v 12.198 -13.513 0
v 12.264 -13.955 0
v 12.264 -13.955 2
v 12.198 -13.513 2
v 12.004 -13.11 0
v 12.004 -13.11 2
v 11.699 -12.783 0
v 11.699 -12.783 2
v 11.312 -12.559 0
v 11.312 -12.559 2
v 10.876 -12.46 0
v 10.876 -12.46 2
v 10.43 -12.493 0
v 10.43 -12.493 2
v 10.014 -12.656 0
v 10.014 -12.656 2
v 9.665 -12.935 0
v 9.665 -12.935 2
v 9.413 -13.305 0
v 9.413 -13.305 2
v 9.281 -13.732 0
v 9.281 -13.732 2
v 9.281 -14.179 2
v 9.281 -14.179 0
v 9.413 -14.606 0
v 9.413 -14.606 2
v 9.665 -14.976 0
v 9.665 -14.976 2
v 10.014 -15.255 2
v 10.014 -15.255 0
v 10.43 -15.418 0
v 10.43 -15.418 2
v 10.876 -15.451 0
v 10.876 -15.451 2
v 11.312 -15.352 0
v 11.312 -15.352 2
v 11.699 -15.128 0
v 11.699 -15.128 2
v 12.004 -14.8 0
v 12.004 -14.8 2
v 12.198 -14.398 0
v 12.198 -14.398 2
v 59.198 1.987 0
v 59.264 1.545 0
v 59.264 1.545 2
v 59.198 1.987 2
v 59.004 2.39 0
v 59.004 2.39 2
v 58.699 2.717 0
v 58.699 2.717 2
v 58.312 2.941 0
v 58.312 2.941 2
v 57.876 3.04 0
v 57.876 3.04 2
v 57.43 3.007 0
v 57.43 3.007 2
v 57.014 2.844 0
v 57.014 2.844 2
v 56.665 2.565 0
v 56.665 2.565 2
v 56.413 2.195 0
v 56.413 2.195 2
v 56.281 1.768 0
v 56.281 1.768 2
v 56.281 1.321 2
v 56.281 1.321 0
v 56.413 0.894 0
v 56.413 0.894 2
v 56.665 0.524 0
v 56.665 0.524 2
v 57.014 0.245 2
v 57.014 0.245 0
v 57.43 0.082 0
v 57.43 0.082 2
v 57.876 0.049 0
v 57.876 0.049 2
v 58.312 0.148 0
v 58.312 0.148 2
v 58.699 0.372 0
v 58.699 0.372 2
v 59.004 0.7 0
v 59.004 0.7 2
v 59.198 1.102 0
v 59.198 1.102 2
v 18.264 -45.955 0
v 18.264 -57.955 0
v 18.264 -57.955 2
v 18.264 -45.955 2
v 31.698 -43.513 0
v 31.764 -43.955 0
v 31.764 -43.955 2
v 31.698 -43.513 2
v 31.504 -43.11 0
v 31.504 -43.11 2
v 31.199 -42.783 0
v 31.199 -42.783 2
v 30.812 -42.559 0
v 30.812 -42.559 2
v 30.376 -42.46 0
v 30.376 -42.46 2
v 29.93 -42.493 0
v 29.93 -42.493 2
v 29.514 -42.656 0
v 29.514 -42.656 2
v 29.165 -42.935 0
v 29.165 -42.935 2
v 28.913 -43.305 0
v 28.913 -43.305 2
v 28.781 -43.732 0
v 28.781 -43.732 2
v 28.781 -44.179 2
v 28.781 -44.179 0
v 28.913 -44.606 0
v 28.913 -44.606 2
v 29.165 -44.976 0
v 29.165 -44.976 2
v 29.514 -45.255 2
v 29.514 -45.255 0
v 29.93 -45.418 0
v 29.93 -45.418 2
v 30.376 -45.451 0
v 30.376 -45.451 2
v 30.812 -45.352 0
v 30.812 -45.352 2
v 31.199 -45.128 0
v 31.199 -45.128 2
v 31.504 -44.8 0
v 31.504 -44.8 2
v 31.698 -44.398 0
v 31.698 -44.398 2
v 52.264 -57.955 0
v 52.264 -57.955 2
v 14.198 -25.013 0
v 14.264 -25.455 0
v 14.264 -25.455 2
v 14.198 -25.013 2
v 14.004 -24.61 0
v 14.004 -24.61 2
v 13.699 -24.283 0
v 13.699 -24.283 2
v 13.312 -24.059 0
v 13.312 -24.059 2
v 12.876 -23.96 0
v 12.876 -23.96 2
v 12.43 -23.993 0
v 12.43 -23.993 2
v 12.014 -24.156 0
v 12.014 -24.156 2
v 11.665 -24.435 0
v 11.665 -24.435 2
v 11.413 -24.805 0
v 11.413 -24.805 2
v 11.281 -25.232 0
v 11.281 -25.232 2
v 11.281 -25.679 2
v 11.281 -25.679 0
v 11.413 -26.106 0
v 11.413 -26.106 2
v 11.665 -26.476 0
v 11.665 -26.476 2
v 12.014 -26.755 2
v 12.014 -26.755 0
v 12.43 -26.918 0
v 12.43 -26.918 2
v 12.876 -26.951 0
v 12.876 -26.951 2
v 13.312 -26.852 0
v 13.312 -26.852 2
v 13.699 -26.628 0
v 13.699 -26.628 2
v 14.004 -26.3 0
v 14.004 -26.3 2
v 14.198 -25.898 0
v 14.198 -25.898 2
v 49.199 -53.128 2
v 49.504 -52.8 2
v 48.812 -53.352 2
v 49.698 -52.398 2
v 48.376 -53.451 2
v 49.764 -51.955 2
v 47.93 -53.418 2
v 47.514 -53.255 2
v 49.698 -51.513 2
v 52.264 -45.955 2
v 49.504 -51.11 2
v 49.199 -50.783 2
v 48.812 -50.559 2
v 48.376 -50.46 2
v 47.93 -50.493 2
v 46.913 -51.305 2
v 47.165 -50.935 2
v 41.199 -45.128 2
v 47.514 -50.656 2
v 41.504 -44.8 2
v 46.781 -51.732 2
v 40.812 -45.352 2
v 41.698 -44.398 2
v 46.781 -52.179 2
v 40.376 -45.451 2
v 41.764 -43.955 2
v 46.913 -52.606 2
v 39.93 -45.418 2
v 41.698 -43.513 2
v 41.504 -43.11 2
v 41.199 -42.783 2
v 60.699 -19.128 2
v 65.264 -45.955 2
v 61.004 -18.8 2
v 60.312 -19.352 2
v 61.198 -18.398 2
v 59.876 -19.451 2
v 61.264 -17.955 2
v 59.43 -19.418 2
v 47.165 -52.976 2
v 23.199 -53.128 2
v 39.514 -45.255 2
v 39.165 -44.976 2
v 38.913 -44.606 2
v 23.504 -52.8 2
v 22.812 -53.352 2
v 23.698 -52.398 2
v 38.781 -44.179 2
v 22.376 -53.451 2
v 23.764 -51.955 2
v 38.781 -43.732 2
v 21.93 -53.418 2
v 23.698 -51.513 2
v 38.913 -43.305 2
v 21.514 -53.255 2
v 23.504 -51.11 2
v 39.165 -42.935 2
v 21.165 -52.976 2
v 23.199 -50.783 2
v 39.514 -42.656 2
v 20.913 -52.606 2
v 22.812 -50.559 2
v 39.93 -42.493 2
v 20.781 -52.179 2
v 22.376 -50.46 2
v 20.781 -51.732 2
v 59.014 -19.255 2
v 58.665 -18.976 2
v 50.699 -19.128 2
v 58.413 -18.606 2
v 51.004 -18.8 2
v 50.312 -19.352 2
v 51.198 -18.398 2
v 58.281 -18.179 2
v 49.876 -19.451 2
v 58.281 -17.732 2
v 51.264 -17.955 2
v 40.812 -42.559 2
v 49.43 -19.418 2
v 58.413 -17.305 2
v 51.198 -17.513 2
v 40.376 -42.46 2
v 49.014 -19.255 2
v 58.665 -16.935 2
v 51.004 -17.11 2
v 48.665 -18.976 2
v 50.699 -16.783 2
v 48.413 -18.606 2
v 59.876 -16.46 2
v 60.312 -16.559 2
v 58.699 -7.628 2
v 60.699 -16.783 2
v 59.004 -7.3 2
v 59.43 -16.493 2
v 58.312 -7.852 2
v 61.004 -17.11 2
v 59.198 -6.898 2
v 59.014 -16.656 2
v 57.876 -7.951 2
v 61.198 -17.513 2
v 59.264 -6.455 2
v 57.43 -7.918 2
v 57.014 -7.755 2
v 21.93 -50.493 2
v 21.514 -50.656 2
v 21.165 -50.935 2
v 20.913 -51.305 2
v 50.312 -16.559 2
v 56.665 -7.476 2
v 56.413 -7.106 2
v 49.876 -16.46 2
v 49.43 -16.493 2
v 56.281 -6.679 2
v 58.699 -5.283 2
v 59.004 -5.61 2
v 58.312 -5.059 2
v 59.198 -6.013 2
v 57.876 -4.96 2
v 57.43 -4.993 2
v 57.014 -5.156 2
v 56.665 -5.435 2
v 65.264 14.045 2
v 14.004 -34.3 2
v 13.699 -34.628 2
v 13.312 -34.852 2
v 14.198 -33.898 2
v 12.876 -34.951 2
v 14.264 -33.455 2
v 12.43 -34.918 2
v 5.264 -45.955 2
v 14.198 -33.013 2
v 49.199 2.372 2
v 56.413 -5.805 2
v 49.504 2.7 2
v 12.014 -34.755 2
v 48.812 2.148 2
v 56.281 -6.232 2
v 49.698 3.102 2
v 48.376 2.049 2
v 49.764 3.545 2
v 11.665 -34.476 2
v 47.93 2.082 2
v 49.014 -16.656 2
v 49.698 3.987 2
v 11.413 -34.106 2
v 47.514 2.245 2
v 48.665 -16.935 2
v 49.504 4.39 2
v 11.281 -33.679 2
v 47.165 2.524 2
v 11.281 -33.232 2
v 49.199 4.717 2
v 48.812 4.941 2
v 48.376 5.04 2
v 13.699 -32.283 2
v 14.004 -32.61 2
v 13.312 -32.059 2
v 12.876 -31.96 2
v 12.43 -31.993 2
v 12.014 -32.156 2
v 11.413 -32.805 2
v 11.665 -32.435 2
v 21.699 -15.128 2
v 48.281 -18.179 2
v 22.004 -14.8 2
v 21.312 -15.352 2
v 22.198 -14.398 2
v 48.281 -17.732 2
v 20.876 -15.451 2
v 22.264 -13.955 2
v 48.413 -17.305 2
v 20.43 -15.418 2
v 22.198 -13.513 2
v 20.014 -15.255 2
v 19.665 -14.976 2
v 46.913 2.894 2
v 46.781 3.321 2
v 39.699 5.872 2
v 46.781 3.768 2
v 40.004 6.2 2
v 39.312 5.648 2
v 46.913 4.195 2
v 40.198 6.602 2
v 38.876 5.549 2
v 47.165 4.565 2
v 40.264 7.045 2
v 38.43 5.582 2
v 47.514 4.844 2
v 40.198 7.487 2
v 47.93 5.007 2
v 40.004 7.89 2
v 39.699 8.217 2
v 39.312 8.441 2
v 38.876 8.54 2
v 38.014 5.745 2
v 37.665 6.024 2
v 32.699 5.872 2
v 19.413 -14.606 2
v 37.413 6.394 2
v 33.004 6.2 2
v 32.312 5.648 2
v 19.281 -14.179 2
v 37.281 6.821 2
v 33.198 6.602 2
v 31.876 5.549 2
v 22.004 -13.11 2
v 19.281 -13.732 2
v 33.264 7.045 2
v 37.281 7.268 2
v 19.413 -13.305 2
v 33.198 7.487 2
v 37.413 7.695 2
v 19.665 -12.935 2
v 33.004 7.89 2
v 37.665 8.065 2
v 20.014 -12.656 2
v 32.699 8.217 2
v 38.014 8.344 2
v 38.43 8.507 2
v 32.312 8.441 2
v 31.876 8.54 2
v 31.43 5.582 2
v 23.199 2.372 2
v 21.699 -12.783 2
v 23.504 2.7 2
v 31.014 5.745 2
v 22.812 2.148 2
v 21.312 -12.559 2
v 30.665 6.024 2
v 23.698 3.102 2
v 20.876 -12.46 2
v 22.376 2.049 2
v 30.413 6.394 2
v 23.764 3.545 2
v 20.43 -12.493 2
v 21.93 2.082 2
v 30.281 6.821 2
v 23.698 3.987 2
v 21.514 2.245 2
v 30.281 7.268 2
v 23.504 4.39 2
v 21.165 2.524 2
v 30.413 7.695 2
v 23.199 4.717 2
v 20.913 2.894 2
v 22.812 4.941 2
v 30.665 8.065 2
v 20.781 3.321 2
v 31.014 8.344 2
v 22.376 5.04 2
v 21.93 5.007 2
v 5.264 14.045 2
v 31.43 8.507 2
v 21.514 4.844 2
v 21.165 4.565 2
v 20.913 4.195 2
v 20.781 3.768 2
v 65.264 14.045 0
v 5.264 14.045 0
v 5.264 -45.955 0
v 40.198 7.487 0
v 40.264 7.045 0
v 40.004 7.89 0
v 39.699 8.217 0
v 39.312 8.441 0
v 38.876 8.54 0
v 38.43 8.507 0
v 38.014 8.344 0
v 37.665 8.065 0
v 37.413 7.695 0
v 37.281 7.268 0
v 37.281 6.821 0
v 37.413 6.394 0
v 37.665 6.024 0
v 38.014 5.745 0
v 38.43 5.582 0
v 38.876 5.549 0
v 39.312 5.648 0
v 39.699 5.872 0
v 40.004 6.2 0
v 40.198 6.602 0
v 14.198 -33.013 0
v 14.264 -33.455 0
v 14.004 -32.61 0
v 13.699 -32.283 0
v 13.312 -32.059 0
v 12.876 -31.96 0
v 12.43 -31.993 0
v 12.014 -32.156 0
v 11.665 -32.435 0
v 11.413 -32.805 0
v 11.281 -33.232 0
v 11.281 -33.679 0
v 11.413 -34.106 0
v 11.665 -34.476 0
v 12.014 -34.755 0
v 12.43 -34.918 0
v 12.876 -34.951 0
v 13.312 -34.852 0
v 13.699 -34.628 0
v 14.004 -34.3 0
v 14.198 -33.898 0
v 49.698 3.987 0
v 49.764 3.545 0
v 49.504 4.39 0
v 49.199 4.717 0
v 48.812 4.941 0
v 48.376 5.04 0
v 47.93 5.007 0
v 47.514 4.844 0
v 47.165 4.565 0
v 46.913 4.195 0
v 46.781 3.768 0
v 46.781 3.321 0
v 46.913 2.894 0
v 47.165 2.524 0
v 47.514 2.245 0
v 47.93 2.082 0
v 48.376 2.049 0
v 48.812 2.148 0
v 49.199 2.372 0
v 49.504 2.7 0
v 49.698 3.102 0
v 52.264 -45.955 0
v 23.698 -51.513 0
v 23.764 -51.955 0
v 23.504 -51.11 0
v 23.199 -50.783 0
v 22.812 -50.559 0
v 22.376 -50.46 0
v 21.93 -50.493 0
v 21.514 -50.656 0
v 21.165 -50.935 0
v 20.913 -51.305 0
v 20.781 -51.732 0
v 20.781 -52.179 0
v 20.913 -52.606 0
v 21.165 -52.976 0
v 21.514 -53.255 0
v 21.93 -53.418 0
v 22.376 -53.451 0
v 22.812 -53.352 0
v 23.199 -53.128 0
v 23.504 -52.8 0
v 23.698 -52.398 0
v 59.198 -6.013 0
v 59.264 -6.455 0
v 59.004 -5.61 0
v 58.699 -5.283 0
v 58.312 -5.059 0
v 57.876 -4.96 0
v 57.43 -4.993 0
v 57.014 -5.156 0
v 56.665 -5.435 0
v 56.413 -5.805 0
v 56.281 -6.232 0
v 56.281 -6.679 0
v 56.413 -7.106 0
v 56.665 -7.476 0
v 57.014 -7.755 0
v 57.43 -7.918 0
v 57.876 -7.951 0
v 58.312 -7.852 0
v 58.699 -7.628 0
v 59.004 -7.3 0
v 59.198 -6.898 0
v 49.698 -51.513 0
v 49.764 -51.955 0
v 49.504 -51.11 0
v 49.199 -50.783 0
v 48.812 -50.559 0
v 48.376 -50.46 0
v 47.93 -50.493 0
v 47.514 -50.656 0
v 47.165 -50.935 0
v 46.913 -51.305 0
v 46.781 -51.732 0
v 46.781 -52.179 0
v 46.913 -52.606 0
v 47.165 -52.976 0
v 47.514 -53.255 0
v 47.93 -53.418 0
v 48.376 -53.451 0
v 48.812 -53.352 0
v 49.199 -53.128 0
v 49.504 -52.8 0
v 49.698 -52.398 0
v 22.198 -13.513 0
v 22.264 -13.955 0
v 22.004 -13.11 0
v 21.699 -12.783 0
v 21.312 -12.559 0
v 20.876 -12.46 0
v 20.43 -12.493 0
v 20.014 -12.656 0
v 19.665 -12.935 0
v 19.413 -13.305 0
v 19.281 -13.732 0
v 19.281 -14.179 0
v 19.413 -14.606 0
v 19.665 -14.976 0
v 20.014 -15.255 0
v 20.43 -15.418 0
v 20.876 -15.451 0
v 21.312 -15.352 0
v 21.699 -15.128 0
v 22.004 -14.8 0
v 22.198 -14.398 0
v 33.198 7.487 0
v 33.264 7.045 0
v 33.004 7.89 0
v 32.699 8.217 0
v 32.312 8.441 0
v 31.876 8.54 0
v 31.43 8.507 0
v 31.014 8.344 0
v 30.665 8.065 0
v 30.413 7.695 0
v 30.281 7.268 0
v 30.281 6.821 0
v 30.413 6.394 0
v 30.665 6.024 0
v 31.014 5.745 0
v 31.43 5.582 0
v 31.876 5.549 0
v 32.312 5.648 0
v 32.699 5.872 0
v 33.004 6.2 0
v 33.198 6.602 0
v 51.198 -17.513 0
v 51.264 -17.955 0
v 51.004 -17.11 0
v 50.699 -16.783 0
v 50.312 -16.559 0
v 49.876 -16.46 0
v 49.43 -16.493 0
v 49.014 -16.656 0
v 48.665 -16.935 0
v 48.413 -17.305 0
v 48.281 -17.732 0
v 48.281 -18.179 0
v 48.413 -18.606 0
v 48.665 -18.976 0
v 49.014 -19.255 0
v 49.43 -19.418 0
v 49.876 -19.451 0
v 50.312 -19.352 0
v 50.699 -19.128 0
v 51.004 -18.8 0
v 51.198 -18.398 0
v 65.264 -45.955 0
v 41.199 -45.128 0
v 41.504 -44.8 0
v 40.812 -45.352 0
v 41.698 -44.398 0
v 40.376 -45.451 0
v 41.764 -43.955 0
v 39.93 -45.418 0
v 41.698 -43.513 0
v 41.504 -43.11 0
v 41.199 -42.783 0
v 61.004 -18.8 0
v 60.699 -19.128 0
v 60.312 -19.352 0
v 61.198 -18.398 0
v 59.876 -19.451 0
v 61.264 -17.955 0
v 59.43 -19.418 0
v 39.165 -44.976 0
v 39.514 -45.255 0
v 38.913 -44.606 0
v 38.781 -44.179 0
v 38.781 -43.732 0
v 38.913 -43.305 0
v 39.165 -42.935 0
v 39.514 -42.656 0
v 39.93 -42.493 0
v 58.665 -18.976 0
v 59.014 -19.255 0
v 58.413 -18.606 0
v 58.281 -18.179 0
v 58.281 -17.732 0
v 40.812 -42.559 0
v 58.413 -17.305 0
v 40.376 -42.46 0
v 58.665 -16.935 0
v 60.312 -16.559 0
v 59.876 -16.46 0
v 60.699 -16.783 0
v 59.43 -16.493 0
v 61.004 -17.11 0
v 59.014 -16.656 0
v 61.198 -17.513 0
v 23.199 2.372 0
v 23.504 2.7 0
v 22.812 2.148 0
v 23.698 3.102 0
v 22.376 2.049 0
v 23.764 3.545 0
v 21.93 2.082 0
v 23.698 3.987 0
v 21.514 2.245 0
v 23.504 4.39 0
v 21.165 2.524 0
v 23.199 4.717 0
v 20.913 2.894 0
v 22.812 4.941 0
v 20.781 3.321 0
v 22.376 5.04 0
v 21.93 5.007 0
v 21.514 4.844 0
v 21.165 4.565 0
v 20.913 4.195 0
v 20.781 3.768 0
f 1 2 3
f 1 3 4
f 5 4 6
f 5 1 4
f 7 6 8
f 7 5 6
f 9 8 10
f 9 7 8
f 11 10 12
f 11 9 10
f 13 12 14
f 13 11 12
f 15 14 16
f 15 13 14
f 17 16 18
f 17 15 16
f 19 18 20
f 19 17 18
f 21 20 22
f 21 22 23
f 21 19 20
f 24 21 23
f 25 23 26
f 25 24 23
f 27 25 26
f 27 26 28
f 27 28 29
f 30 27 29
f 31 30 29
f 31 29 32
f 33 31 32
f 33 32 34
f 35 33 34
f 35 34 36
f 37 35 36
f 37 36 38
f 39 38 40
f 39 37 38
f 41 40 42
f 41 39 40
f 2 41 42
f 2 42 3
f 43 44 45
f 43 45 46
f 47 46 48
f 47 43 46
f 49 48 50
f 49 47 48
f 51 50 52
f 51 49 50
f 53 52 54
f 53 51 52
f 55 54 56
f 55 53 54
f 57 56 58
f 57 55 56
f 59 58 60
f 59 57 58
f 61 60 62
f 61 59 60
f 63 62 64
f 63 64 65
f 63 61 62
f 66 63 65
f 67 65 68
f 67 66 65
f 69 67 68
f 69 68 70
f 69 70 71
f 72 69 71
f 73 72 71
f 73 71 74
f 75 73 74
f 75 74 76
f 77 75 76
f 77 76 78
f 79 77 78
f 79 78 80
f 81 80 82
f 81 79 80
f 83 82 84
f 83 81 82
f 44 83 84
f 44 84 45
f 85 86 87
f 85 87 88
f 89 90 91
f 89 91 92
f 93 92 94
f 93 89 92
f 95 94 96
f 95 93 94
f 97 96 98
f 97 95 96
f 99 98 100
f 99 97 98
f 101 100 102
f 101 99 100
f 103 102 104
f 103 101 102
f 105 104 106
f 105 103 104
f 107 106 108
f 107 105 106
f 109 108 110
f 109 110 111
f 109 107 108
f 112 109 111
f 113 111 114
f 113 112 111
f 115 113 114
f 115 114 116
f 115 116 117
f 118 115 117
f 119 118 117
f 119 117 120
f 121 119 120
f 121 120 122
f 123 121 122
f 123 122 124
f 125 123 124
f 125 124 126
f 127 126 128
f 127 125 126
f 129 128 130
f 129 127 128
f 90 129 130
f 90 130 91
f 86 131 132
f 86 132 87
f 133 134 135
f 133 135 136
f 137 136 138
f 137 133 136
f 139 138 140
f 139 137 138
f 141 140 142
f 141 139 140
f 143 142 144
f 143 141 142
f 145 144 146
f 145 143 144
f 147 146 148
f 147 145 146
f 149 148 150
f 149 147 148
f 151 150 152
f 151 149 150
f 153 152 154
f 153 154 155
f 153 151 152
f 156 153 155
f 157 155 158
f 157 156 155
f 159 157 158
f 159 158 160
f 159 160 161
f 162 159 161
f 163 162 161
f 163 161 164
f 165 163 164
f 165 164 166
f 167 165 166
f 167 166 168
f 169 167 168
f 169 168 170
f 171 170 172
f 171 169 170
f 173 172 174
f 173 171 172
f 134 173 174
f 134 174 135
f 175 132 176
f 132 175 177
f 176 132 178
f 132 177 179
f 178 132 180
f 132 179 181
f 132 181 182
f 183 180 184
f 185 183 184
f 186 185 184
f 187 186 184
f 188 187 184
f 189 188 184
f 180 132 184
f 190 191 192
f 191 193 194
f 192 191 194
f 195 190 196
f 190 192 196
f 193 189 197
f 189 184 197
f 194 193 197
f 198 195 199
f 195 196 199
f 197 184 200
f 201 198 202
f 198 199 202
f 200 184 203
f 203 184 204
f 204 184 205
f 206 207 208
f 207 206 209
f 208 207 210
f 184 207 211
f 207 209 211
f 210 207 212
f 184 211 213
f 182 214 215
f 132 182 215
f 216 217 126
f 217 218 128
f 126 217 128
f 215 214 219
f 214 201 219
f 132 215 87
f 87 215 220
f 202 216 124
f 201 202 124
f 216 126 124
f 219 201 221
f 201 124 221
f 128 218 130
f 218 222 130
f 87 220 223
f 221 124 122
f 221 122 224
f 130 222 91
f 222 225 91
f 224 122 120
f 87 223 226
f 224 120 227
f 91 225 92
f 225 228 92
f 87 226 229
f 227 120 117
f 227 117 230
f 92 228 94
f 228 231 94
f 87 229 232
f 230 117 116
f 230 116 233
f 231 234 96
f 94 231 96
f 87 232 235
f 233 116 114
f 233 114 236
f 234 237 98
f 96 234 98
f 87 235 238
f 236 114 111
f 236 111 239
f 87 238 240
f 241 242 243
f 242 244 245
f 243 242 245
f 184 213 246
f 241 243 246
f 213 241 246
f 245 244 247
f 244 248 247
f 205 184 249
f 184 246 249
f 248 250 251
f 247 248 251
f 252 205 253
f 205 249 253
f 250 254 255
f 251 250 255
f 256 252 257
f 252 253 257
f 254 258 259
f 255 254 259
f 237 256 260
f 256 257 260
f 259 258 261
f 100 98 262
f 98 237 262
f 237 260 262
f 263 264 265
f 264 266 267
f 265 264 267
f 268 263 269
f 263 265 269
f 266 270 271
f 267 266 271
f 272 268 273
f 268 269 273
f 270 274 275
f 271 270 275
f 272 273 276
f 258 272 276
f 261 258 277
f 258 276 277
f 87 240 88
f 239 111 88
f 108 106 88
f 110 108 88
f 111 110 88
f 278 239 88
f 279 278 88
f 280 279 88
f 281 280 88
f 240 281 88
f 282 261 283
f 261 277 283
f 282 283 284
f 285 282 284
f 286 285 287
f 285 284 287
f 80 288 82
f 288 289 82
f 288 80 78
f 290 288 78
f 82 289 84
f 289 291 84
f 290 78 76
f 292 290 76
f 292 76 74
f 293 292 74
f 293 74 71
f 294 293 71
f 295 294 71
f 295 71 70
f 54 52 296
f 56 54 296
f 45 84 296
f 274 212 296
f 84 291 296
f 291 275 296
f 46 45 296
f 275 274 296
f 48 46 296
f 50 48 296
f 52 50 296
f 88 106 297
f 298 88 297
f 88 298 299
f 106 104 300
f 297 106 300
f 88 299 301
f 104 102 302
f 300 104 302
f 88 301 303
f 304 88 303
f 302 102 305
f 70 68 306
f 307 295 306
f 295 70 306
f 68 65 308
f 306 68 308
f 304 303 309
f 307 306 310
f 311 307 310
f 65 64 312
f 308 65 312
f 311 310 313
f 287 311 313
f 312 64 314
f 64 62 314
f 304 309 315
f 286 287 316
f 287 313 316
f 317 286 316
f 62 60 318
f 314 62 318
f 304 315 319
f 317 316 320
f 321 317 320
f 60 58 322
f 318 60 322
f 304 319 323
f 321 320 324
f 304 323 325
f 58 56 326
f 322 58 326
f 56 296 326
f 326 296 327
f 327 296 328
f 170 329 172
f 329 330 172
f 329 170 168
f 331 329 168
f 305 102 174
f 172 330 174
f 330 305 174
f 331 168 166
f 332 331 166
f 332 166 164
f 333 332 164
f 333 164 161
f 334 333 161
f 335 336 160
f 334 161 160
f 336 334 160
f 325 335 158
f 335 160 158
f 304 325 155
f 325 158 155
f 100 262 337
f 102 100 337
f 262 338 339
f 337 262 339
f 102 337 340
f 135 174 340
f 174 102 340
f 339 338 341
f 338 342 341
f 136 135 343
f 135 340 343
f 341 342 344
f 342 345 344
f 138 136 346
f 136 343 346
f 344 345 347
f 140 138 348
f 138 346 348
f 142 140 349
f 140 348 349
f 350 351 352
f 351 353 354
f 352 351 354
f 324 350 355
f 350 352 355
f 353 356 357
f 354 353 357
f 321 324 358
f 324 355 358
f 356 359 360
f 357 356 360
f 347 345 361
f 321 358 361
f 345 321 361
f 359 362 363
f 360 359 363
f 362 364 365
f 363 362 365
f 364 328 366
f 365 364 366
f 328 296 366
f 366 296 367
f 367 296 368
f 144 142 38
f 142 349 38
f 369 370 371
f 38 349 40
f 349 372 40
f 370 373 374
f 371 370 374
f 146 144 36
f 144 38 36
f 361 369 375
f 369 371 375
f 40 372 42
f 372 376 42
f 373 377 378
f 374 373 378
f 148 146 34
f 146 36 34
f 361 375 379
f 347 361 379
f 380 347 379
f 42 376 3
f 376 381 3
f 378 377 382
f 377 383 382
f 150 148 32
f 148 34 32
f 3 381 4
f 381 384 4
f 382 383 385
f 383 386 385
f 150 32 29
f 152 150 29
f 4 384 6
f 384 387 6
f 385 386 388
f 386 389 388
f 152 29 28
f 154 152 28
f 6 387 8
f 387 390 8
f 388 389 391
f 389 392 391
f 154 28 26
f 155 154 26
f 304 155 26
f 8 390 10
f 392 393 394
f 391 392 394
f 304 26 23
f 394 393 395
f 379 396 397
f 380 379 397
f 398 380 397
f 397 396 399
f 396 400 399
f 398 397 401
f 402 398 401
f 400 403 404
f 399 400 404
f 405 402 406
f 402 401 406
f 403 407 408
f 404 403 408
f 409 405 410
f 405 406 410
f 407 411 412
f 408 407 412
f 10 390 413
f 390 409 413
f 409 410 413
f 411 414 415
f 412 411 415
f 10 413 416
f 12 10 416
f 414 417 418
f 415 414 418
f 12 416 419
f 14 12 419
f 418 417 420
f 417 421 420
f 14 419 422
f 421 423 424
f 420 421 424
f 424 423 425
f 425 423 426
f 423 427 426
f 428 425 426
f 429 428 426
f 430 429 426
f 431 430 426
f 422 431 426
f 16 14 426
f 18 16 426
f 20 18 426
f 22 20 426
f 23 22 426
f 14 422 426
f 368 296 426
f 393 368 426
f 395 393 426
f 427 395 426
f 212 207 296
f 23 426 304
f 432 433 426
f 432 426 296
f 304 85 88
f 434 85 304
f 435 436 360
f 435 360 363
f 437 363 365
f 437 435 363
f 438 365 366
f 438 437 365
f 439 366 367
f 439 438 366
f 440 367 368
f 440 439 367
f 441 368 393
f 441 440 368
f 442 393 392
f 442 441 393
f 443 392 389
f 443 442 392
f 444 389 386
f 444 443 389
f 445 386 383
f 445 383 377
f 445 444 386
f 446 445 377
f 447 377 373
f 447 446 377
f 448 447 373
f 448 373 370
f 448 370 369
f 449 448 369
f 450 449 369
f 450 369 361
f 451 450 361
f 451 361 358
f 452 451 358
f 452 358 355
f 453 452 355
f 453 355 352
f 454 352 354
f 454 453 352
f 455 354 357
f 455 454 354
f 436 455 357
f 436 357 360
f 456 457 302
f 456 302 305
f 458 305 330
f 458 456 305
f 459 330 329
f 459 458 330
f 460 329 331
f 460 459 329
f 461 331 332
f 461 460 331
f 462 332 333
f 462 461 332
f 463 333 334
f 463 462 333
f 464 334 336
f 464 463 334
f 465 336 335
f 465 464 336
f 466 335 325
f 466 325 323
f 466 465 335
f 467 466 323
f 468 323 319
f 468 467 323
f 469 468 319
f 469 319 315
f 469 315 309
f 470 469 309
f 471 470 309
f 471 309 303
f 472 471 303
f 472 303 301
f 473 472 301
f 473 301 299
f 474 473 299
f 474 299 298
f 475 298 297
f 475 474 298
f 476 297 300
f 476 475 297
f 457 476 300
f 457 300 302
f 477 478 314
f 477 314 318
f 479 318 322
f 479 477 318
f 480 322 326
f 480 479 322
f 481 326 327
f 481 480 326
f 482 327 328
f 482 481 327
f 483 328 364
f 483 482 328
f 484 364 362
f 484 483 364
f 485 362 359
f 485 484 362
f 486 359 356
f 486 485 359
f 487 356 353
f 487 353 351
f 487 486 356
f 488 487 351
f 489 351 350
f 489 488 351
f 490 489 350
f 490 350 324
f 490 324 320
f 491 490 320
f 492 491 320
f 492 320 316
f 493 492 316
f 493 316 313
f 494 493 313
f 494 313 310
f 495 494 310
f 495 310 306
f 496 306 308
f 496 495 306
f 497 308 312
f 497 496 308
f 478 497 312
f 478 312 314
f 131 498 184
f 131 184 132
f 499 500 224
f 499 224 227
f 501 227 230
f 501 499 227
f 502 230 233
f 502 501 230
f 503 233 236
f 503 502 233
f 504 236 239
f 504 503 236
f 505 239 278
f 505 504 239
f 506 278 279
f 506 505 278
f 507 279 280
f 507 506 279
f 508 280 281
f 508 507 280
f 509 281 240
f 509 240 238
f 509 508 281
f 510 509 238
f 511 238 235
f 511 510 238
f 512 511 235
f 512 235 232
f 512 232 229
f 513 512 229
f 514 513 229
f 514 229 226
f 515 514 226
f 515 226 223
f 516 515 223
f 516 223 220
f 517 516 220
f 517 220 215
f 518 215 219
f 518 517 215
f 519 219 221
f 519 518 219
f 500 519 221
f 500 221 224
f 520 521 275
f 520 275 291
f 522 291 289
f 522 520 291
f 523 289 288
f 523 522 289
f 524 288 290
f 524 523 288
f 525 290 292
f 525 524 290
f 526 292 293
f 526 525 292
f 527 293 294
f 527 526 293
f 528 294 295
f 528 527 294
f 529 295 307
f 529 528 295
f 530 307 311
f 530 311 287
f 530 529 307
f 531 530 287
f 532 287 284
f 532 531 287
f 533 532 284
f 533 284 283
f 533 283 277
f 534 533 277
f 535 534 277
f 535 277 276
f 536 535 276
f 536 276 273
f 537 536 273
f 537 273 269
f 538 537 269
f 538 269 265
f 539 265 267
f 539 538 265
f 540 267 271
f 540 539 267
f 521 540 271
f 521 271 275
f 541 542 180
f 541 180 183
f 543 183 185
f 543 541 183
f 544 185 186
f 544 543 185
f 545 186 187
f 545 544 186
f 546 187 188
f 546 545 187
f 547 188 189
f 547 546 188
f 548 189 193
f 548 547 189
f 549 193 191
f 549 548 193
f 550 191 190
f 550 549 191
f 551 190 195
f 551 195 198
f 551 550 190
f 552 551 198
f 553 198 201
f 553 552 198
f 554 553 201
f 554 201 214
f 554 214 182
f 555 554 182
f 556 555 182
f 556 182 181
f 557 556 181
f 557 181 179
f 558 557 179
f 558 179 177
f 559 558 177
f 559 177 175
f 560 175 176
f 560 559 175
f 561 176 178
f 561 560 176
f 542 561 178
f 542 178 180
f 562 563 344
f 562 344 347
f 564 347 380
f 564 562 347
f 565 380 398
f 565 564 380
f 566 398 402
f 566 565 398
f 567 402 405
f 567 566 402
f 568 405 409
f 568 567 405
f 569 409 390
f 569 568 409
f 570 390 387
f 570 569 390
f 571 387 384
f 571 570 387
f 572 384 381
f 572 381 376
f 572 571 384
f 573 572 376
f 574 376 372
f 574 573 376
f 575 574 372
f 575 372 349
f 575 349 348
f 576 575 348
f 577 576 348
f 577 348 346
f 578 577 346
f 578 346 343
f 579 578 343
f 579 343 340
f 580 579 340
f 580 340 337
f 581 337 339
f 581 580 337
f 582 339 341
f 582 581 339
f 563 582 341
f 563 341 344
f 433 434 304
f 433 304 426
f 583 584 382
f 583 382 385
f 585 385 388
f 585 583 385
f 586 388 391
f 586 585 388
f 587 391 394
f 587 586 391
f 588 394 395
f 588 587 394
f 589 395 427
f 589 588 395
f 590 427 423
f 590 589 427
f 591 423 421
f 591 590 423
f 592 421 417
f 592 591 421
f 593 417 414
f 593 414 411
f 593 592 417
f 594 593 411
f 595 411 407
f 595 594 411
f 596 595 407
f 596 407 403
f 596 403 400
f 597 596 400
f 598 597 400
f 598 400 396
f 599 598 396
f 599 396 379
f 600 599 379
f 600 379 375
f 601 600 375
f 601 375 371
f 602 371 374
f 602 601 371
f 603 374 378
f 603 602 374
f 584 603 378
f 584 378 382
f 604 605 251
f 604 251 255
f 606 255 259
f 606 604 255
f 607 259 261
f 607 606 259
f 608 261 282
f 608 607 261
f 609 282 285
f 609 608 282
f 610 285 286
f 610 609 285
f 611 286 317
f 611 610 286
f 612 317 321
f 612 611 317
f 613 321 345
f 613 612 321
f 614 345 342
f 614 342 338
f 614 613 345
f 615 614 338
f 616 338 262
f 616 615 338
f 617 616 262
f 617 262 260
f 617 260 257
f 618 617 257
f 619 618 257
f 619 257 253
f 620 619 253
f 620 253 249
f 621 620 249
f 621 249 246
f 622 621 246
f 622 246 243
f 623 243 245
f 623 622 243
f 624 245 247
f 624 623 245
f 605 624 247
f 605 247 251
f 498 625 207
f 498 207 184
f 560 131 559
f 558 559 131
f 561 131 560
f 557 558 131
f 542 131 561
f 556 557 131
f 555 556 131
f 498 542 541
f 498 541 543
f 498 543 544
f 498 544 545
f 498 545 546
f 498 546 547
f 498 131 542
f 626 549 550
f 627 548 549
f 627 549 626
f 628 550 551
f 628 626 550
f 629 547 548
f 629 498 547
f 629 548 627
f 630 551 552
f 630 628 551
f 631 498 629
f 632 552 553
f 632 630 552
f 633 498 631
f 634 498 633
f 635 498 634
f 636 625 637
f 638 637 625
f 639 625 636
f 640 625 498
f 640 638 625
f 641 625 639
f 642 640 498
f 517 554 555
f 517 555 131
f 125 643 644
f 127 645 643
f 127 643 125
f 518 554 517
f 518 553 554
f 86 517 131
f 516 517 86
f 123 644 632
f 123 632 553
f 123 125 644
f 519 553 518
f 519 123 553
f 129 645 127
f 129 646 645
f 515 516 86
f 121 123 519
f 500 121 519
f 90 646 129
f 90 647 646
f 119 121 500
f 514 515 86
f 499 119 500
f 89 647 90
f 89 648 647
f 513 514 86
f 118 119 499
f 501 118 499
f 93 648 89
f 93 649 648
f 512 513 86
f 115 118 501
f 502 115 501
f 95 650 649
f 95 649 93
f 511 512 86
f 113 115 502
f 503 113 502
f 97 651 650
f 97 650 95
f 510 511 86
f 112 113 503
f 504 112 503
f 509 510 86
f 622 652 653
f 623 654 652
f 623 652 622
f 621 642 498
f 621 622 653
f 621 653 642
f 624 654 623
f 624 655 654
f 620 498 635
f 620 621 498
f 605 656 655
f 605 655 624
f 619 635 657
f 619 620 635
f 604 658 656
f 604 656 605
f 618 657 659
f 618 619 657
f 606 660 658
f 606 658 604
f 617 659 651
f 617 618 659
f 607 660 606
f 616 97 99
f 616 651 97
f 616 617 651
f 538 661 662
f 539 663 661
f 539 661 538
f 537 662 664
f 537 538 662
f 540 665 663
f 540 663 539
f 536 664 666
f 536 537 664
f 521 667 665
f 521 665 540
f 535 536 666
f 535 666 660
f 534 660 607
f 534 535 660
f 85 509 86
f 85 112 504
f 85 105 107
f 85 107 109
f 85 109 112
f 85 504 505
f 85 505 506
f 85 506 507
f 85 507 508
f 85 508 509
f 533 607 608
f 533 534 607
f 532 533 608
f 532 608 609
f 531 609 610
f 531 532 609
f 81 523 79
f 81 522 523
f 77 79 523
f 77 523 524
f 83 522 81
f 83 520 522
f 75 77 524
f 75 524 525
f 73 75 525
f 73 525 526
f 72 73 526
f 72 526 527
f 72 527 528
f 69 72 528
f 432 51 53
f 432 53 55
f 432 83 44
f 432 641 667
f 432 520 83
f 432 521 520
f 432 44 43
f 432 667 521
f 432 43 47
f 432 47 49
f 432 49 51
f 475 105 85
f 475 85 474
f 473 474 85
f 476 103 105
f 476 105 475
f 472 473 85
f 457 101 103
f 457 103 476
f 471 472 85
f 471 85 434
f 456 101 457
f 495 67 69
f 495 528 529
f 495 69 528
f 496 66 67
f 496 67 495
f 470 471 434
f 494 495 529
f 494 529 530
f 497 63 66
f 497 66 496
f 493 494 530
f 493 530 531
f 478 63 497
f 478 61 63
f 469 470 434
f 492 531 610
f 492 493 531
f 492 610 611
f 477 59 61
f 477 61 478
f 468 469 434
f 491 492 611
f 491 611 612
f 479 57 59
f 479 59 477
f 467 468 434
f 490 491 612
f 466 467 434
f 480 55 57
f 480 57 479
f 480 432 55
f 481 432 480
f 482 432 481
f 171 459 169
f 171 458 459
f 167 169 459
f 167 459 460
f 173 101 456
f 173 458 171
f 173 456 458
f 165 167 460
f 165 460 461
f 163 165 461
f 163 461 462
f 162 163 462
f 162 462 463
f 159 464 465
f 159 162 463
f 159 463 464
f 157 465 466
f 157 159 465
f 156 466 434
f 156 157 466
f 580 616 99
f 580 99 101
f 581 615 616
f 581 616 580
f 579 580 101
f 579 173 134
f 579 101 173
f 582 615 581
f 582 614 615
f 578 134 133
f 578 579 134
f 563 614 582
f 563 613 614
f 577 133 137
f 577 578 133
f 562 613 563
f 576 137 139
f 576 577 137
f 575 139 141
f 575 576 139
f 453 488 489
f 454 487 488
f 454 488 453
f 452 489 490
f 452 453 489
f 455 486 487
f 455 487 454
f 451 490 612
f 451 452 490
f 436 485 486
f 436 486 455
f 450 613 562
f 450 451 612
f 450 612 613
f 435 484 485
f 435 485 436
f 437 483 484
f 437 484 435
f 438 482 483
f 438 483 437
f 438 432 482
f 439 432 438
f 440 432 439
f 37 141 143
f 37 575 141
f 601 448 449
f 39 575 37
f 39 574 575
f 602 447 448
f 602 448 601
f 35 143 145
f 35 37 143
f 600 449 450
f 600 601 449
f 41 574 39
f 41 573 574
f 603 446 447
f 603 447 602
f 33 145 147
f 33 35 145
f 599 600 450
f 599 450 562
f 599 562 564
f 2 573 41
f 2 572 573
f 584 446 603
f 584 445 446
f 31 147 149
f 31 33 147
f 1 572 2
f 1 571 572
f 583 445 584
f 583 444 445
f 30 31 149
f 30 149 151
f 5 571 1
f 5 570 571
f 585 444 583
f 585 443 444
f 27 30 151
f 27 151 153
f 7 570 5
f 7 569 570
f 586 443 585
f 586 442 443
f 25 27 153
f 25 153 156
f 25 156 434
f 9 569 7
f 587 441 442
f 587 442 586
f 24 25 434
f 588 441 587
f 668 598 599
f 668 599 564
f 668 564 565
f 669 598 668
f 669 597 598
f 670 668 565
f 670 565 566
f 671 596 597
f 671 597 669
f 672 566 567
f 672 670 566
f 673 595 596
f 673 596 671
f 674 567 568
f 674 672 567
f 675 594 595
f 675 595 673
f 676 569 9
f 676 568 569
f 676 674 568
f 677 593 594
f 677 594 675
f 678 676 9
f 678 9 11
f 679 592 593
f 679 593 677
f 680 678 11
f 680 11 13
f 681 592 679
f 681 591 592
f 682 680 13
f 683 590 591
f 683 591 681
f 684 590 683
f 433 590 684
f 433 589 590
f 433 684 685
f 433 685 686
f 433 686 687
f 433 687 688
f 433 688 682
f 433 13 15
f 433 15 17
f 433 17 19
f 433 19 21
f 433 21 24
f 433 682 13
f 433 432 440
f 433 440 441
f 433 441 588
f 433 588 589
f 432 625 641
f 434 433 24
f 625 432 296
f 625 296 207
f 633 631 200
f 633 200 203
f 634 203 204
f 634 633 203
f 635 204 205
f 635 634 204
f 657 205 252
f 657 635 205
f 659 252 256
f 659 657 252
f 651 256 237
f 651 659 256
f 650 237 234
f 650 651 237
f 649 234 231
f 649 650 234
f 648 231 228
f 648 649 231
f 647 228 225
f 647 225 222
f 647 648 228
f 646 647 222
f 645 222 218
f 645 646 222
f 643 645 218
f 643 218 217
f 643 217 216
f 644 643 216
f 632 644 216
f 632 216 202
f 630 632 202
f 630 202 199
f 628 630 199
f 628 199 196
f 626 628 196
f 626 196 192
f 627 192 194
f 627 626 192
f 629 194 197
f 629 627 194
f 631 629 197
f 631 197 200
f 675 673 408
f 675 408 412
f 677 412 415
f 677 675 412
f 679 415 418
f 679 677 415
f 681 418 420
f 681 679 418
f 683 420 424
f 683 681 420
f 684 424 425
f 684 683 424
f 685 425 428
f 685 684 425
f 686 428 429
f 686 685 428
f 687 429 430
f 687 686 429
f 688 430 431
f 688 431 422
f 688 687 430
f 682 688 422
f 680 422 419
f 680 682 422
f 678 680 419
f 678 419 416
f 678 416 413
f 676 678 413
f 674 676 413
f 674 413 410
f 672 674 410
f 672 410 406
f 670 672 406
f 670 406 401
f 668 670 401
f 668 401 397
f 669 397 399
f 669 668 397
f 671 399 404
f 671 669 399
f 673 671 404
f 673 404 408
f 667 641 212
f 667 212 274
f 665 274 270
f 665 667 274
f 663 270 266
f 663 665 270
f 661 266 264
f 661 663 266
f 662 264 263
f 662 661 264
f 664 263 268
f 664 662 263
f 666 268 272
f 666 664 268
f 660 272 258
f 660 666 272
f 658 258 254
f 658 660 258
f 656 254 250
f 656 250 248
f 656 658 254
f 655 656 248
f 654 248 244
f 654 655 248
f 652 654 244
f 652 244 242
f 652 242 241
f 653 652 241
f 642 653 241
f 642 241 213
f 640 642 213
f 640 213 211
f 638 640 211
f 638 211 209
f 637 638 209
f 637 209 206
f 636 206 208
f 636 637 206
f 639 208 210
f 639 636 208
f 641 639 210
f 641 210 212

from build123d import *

# Parameters (mm, degrees)
ESQUISSE1_R      = 1.5
EXTRUSION1_DEPTH = 2


with BuildPart() as part:
    # Esquisse1 → Extrusion1 (new body)
    with BuildSketch(Plane.XY):
        Polygon((5.264207965, 14.044526316), (65.264207965, 14.044526316), (65.264207965, -45.955473684), (52.264207965, -45.955473684), (52.264207965, -57.955473684), (18.264207965, -57.955473684), (18.264207965, -45.955473684), (5.264207965, -45.955473684), align=None)
        with Locations((57.764207965, 1.544526316)):
            Circle(ESQUISSE1_R, mode=Mode.SUBTRACT)
        with Locations((57.764207965, -6.455473684)):
            Circle(ESQUISSE1_R, mode=Mode.SUBTRACT)
        with Locations((12.764207965, -33.455473684)):
            Circle(ESQUISSE1_R, mode=Mode.SUBTRACT)
        with Locations((12.764207965, -25.455473684)):
            Circle(ESQUISSE1_R, mode=Mode.SUBTRACT)
        with Locations((40.264207965, -43.955473684)):
            Circle(ESQUISSE1_R, mode=Mode.SUBTRACT)
        with Locations((30.264207965, -43.955473684)):
            Circle(ESQUISSE1_R, mode=Mode.SUBTRACT)
        with Locations((49.764207965, -17.955473684)):
            Circle(ESQUISSE1_R, mode=Mode.SUBTRACT)
        with Locations((59.764207965, -17.955473684)):
            Circle(ESQUISSE1_R, mode=Mode.SUBTRACT)
        with Locations((31.764207965, 7.044526316)):
            Circle(ESQUISSE1_R, mode=Mode.SUBTRACT)
        with Locations((38.764207965, 7.044526316)):
            Circle(ESQUISSE1_R, mode=Mode.SUBTRACT)
        with Locations((22.264207965, 3.544526316)):
            Circle(ESQUISSE1_R, mode=Mode.SUBTRACT)
        with Locations((48.264207965, 3.544526316)):
            Circle(ESQUISSE1_R, mode=Mode.SUBTRACT)
        with Locations((20.764207965, -13.955473684)):
            Circle(ESQUISSE1_R, mode=Mode.SUBTRACT)
        with Locations((10.764207965, -13.955473684)):
            Circle(ESQUISSE1_R, mode=Mode.SUBTRACT)
        with Locations((22.264207965, -51.955473684)):
            Circle(ESQUISSE1_R, mode=Mode.SUBTRACT)
        with Locations((48.264207965, -51.955473684)):
            Circle(ESQUISSE1_R, mode=Mode.SUBTRACT)
    extrude(amount=EXTRUSION1_DEPTH)


solid = part.part
